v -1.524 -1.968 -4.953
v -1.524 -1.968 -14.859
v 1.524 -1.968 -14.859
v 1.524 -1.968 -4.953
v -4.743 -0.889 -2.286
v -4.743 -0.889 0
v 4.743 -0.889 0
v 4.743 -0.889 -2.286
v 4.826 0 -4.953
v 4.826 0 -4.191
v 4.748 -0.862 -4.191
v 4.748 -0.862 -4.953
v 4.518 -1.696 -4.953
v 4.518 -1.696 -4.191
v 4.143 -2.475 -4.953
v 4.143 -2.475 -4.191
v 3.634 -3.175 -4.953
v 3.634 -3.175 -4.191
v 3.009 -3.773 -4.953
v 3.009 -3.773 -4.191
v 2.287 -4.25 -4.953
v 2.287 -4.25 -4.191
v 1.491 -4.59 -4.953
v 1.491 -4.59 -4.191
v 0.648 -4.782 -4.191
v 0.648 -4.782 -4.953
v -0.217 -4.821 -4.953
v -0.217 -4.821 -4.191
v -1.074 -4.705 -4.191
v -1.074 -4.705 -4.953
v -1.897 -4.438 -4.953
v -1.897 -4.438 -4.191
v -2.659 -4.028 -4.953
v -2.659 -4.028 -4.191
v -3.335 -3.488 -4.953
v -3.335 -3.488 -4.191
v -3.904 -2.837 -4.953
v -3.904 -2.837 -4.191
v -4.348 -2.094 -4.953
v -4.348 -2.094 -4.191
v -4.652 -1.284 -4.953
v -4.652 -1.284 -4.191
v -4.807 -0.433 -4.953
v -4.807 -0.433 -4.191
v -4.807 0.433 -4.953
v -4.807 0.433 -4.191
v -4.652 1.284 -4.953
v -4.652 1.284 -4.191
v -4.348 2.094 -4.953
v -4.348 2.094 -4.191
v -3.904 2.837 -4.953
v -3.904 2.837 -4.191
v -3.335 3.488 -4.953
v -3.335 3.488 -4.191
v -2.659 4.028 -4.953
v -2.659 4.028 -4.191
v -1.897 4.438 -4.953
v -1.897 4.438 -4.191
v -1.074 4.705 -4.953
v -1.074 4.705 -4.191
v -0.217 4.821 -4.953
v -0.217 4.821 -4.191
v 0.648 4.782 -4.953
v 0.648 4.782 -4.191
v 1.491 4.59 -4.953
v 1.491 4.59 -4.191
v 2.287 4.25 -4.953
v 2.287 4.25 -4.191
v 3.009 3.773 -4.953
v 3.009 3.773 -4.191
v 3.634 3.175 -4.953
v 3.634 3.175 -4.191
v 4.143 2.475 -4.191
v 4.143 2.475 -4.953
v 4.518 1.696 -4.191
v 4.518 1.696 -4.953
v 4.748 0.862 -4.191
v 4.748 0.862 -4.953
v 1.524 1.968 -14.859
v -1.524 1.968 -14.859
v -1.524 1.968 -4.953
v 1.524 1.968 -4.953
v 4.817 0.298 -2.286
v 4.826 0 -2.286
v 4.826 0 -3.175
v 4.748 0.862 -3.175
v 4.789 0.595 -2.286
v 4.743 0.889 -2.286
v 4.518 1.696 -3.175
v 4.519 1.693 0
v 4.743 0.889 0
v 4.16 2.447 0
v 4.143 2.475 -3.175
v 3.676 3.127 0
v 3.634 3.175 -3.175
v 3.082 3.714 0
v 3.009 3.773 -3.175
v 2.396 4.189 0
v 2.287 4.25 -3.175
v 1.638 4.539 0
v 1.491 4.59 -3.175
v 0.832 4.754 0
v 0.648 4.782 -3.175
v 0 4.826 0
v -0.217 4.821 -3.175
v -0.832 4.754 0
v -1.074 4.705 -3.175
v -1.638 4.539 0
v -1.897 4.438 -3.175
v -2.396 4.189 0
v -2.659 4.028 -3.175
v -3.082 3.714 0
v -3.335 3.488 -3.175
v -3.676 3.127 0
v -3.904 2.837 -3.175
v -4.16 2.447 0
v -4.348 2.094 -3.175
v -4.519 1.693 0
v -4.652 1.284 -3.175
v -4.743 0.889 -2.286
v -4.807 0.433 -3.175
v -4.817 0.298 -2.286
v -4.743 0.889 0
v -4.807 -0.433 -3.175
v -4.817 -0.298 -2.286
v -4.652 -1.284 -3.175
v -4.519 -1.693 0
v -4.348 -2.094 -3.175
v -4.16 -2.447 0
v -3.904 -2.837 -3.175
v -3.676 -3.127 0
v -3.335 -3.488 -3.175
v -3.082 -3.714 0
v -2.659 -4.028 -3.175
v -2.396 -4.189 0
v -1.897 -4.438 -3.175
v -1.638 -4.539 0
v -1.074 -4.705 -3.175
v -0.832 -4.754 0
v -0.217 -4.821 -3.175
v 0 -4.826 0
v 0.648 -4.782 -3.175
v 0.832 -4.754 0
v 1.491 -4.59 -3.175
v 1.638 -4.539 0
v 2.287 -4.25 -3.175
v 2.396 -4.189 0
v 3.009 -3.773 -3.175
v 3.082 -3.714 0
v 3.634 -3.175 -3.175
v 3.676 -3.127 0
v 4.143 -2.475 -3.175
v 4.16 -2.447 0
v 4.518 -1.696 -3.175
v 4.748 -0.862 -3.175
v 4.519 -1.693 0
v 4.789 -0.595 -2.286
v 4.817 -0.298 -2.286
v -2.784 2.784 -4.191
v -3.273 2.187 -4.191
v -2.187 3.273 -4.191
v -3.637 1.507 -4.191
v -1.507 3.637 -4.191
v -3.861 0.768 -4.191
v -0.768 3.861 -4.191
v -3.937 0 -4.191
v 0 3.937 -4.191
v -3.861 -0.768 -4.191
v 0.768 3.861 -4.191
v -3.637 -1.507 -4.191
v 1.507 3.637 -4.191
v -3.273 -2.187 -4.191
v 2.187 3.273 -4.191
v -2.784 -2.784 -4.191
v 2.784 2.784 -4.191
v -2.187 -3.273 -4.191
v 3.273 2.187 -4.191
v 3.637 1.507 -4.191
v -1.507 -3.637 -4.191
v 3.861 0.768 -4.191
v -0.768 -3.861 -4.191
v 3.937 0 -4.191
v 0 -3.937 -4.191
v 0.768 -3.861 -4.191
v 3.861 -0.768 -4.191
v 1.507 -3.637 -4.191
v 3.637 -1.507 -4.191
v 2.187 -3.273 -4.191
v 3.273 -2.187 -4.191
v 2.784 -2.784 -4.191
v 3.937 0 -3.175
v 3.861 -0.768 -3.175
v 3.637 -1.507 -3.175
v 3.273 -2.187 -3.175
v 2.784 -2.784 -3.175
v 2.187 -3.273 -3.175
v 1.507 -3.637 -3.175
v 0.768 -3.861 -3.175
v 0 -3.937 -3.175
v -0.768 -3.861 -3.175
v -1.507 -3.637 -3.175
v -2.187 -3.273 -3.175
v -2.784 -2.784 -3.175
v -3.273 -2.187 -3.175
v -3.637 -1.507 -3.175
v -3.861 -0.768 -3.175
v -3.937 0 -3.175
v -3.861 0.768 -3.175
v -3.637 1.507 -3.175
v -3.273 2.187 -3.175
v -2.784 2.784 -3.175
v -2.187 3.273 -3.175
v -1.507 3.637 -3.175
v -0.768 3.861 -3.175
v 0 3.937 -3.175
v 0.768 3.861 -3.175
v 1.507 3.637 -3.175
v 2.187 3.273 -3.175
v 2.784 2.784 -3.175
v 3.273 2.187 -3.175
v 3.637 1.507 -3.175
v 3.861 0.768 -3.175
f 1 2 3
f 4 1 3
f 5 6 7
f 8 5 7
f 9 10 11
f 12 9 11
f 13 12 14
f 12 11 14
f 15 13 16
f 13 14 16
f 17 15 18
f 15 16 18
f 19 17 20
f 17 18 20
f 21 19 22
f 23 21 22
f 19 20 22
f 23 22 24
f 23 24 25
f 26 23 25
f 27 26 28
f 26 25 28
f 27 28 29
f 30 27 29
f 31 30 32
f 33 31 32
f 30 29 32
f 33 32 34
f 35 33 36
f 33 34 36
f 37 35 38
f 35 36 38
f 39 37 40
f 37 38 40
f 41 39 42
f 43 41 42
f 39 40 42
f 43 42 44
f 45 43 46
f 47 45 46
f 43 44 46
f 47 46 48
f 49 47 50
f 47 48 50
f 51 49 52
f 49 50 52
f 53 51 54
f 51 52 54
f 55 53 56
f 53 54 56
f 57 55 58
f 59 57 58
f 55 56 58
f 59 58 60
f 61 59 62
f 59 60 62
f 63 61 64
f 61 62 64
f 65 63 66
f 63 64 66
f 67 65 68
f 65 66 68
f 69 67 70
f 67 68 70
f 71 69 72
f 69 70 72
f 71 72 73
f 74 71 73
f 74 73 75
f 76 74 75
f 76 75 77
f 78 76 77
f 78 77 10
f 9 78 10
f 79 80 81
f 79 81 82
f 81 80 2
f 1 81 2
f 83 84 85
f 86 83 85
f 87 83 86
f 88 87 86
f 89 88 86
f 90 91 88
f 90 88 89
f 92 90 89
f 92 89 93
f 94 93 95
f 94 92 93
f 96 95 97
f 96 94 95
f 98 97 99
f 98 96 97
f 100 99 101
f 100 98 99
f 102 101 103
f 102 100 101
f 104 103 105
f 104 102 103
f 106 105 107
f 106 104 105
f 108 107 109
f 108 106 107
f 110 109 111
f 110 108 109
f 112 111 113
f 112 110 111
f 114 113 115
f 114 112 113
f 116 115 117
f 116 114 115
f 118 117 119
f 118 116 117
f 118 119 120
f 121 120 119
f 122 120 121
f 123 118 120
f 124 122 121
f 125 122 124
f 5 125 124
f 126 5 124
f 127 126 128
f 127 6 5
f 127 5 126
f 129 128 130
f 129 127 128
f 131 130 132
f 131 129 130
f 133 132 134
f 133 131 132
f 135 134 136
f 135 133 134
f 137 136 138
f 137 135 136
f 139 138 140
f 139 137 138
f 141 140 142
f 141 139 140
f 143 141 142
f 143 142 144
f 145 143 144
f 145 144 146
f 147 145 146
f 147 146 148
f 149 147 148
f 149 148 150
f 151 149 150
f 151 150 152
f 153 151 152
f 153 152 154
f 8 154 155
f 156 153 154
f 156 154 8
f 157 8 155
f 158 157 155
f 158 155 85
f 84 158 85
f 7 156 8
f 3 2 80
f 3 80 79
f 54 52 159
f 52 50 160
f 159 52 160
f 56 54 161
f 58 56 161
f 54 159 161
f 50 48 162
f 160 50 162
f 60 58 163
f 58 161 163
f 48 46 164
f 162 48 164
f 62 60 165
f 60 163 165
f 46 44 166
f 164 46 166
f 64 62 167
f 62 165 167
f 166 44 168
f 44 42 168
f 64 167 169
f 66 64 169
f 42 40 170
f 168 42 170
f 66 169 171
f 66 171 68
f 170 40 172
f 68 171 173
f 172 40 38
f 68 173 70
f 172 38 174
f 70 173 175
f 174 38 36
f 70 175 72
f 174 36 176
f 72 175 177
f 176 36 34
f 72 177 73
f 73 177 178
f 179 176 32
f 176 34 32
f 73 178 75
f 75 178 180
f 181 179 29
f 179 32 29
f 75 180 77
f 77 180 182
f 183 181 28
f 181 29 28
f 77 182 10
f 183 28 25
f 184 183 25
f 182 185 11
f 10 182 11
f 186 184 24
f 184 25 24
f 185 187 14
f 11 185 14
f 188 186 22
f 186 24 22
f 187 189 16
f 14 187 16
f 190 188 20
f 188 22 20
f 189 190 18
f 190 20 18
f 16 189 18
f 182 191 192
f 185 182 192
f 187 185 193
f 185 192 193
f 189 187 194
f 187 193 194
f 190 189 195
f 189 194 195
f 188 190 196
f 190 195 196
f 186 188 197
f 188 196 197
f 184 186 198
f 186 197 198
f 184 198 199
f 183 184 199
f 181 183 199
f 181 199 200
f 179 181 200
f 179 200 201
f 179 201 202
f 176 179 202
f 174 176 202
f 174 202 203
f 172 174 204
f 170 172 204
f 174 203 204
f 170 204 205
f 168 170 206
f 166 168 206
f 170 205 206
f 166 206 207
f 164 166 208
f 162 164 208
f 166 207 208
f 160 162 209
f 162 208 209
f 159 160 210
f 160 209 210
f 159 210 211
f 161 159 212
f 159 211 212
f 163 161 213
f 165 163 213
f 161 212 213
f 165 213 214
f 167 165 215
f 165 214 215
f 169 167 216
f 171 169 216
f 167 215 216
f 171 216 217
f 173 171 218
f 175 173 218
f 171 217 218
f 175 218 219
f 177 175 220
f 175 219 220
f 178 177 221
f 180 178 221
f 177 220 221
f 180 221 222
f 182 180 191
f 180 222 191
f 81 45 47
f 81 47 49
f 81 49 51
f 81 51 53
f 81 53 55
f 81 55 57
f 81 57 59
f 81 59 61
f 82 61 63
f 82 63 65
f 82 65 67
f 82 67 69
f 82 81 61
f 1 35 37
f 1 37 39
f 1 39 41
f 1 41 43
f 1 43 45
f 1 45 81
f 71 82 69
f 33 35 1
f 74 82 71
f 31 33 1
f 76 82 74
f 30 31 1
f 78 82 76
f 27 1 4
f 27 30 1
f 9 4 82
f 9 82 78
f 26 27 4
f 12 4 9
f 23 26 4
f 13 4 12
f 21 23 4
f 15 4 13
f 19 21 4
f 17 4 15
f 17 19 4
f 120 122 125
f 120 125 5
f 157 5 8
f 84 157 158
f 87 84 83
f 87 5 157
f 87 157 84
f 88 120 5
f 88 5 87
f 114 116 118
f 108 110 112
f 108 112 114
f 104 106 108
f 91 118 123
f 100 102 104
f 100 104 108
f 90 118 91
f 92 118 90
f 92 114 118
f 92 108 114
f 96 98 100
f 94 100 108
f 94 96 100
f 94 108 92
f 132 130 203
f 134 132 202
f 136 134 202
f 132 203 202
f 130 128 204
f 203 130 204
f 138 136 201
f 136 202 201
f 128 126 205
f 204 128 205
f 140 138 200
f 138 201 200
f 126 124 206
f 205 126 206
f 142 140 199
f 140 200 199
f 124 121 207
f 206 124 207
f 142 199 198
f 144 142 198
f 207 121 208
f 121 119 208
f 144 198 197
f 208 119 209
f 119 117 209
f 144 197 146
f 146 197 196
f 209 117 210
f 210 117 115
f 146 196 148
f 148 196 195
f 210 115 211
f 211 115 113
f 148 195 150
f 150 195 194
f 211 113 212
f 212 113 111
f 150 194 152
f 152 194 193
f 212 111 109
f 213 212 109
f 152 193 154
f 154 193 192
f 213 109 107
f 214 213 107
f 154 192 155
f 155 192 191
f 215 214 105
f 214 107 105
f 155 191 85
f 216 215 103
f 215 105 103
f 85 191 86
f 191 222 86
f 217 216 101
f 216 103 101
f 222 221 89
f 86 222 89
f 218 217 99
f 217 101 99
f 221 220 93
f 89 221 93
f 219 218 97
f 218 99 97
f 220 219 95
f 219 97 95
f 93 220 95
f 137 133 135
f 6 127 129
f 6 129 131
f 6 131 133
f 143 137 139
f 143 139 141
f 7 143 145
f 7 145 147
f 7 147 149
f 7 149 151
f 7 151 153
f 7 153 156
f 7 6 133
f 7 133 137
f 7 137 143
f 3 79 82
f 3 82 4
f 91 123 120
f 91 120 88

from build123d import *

# Parameters (mm, degrees)
F0_R     = 4.826
F1_DEPTH = 3.175
F2_W     = 11.9897948747
F2_H     = 1.778
F3_DEPTH = 2.286
F4_R     = 3.937
F5_DEPTH = 1.016
F6_R     = 4.826
F7_DEPTH = 0.762
F8_W     = 3.048
F8_H     = 3.937
F9_DEPTH = 9.906


# Not quite as in the source:
# - the program builds the solid bodies; features that only make, move or delete a surface that nothing else refers to are left out


with BuildPart() as f1:
    # F0 (on Top) → F1 (new body)
    with BuildSketch(Plane.XY):
        Circle(F0_R)
    extrude(amount=-F1_DEPTH)

    # F2 (on face) → F3 (cut)
    with BuildSketch(Plane.XY):
        Rectangle(F2_W, F2_H)
    extrude(amount=-F3_DEPTH, mode=Mode.SUBTRACT)

    # F4 (on face) → F5 (join)
    with BuildSketch(Plane(origin=(0, 0, -3.175), x_dir=(1, 0, 0), z_dir=(0, 0, -1))):
        Circle(F4_R)
    extrude(amount=F5_DEPTH)

    # F6 (on face) → F7 (join)
    with BuildSketch(Plane(origin=(0, 0, -4.191), x_dir=(1, 0, 0), z_dir=(0, 0, -1))):
        Circle(F6_R)
    extrude(amount=F7_DEPTH)

    # F8 (on face) → F9 (join)
    with BuildSketch(Plane(origin=(0, 0, -4.953), x_dir=(1, 0, 0), z_dir=(0, 0, -1))):
        Rectangle(F8_W, F8_H)
    extrude(amount=F9_DEPTH)


solid = f1.part
